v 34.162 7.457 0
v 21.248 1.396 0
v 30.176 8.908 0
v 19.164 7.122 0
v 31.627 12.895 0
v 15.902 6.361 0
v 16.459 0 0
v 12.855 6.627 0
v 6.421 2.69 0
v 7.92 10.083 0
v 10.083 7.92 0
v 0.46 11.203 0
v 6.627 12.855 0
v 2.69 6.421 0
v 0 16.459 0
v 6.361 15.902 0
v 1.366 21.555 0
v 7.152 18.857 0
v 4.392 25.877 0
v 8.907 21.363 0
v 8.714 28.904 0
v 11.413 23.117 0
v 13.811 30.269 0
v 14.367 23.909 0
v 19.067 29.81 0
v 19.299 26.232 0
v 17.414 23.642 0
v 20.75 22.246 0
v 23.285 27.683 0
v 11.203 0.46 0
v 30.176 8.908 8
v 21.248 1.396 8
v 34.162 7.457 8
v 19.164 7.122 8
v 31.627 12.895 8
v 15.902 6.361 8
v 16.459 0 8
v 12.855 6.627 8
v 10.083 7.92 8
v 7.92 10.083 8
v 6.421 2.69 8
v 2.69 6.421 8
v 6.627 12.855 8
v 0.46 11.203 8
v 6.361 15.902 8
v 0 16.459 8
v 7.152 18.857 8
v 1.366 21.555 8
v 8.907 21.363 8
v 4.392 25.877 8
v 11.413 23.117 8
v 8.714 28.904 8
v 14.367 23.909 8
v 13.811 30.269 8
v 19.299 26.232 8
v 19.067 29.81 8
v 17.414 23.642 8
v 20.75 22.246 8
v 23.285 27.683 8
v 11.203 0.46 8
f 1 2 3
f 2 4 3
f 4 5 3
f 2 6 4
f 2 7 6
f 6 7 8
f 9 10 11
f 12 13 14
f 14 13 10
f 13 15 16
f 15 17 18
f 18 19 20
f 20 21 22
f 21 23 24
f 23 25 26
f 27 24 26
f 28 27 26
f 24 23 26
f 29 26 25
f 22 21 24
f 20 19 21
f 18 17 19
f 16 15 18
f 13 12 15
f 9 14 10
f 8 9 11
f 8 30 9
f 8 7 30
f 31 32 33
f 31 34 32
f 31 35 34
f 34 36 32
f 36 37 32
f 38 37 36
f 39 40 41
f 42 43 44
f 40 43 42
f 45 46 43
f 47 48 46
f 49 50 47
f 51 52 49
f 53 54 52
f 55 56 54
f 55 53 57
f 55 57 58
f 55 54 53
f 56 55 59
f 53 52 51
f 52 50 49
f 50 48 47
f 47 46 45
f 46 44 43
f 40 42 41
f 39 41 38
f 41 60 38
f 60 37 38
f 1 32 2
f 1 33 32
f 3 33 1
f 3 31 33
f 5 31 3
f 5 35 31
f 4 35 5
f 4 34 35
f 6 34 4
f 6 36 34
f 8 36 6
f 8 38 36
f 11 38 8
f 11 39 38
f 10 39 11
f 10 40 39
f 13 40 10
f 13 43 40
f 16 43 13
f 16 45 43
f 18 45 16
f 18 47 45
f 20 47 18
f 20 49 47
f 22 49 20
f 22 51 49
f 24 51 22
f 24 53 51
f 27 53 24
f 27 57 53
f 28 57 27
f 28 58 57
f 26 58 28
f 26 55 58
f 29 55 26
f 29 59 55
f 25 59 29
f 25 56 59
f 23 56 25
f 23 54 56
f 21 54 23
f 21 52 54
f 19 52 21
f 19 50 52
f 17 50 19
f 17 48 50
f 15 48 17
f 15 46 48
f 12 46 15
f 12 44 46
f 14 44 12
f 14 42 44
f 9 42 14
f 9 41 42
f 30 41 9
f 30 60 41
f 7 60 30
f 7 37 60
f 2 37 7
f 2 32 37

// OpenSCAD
$fn = 32;

// ----------------------------------------------------------------------
// Eye lug: ring_tail, 8 mm thick
// ----------------------------------------------------------------------

// --- parameters (mm) ---
profile_height = 8;       // extrusion height
profile_points = 30;      // points of the closed outline

profile = [[19.299, 26.232], [23.285, 27.683], [19.067, 29.81], [13.811, 30.269], [8.714, 28.904], [4.392, 25.877], [1.366, 21.555], [0, 16.459], [0.46, 11.203], [2.69, 6.421], [6.421, 2.69], [11.203, 0.46], [16.459, 0], [21.248, 1.396], [34.162, 7.457], [30.176, 8.908], [31.627, 12.895], [19.164, 7.122], [15.902, 6.361], [12.855, 6.627], [10.083, 7.92], [7.92, 10.083], [6.627, 12.855], [6.361, 15.902], [7.152, 18.857], [8.907, 21.363], [11.413, 23.117], [14.367, 23.909], [17.414, 23.642], [20.75, 22.246]];  // single closed polygon, 30 points, counter clockwise

// --- the one profile operation ---
linear_extrude(height = profile_height) polygon(points = profile);
